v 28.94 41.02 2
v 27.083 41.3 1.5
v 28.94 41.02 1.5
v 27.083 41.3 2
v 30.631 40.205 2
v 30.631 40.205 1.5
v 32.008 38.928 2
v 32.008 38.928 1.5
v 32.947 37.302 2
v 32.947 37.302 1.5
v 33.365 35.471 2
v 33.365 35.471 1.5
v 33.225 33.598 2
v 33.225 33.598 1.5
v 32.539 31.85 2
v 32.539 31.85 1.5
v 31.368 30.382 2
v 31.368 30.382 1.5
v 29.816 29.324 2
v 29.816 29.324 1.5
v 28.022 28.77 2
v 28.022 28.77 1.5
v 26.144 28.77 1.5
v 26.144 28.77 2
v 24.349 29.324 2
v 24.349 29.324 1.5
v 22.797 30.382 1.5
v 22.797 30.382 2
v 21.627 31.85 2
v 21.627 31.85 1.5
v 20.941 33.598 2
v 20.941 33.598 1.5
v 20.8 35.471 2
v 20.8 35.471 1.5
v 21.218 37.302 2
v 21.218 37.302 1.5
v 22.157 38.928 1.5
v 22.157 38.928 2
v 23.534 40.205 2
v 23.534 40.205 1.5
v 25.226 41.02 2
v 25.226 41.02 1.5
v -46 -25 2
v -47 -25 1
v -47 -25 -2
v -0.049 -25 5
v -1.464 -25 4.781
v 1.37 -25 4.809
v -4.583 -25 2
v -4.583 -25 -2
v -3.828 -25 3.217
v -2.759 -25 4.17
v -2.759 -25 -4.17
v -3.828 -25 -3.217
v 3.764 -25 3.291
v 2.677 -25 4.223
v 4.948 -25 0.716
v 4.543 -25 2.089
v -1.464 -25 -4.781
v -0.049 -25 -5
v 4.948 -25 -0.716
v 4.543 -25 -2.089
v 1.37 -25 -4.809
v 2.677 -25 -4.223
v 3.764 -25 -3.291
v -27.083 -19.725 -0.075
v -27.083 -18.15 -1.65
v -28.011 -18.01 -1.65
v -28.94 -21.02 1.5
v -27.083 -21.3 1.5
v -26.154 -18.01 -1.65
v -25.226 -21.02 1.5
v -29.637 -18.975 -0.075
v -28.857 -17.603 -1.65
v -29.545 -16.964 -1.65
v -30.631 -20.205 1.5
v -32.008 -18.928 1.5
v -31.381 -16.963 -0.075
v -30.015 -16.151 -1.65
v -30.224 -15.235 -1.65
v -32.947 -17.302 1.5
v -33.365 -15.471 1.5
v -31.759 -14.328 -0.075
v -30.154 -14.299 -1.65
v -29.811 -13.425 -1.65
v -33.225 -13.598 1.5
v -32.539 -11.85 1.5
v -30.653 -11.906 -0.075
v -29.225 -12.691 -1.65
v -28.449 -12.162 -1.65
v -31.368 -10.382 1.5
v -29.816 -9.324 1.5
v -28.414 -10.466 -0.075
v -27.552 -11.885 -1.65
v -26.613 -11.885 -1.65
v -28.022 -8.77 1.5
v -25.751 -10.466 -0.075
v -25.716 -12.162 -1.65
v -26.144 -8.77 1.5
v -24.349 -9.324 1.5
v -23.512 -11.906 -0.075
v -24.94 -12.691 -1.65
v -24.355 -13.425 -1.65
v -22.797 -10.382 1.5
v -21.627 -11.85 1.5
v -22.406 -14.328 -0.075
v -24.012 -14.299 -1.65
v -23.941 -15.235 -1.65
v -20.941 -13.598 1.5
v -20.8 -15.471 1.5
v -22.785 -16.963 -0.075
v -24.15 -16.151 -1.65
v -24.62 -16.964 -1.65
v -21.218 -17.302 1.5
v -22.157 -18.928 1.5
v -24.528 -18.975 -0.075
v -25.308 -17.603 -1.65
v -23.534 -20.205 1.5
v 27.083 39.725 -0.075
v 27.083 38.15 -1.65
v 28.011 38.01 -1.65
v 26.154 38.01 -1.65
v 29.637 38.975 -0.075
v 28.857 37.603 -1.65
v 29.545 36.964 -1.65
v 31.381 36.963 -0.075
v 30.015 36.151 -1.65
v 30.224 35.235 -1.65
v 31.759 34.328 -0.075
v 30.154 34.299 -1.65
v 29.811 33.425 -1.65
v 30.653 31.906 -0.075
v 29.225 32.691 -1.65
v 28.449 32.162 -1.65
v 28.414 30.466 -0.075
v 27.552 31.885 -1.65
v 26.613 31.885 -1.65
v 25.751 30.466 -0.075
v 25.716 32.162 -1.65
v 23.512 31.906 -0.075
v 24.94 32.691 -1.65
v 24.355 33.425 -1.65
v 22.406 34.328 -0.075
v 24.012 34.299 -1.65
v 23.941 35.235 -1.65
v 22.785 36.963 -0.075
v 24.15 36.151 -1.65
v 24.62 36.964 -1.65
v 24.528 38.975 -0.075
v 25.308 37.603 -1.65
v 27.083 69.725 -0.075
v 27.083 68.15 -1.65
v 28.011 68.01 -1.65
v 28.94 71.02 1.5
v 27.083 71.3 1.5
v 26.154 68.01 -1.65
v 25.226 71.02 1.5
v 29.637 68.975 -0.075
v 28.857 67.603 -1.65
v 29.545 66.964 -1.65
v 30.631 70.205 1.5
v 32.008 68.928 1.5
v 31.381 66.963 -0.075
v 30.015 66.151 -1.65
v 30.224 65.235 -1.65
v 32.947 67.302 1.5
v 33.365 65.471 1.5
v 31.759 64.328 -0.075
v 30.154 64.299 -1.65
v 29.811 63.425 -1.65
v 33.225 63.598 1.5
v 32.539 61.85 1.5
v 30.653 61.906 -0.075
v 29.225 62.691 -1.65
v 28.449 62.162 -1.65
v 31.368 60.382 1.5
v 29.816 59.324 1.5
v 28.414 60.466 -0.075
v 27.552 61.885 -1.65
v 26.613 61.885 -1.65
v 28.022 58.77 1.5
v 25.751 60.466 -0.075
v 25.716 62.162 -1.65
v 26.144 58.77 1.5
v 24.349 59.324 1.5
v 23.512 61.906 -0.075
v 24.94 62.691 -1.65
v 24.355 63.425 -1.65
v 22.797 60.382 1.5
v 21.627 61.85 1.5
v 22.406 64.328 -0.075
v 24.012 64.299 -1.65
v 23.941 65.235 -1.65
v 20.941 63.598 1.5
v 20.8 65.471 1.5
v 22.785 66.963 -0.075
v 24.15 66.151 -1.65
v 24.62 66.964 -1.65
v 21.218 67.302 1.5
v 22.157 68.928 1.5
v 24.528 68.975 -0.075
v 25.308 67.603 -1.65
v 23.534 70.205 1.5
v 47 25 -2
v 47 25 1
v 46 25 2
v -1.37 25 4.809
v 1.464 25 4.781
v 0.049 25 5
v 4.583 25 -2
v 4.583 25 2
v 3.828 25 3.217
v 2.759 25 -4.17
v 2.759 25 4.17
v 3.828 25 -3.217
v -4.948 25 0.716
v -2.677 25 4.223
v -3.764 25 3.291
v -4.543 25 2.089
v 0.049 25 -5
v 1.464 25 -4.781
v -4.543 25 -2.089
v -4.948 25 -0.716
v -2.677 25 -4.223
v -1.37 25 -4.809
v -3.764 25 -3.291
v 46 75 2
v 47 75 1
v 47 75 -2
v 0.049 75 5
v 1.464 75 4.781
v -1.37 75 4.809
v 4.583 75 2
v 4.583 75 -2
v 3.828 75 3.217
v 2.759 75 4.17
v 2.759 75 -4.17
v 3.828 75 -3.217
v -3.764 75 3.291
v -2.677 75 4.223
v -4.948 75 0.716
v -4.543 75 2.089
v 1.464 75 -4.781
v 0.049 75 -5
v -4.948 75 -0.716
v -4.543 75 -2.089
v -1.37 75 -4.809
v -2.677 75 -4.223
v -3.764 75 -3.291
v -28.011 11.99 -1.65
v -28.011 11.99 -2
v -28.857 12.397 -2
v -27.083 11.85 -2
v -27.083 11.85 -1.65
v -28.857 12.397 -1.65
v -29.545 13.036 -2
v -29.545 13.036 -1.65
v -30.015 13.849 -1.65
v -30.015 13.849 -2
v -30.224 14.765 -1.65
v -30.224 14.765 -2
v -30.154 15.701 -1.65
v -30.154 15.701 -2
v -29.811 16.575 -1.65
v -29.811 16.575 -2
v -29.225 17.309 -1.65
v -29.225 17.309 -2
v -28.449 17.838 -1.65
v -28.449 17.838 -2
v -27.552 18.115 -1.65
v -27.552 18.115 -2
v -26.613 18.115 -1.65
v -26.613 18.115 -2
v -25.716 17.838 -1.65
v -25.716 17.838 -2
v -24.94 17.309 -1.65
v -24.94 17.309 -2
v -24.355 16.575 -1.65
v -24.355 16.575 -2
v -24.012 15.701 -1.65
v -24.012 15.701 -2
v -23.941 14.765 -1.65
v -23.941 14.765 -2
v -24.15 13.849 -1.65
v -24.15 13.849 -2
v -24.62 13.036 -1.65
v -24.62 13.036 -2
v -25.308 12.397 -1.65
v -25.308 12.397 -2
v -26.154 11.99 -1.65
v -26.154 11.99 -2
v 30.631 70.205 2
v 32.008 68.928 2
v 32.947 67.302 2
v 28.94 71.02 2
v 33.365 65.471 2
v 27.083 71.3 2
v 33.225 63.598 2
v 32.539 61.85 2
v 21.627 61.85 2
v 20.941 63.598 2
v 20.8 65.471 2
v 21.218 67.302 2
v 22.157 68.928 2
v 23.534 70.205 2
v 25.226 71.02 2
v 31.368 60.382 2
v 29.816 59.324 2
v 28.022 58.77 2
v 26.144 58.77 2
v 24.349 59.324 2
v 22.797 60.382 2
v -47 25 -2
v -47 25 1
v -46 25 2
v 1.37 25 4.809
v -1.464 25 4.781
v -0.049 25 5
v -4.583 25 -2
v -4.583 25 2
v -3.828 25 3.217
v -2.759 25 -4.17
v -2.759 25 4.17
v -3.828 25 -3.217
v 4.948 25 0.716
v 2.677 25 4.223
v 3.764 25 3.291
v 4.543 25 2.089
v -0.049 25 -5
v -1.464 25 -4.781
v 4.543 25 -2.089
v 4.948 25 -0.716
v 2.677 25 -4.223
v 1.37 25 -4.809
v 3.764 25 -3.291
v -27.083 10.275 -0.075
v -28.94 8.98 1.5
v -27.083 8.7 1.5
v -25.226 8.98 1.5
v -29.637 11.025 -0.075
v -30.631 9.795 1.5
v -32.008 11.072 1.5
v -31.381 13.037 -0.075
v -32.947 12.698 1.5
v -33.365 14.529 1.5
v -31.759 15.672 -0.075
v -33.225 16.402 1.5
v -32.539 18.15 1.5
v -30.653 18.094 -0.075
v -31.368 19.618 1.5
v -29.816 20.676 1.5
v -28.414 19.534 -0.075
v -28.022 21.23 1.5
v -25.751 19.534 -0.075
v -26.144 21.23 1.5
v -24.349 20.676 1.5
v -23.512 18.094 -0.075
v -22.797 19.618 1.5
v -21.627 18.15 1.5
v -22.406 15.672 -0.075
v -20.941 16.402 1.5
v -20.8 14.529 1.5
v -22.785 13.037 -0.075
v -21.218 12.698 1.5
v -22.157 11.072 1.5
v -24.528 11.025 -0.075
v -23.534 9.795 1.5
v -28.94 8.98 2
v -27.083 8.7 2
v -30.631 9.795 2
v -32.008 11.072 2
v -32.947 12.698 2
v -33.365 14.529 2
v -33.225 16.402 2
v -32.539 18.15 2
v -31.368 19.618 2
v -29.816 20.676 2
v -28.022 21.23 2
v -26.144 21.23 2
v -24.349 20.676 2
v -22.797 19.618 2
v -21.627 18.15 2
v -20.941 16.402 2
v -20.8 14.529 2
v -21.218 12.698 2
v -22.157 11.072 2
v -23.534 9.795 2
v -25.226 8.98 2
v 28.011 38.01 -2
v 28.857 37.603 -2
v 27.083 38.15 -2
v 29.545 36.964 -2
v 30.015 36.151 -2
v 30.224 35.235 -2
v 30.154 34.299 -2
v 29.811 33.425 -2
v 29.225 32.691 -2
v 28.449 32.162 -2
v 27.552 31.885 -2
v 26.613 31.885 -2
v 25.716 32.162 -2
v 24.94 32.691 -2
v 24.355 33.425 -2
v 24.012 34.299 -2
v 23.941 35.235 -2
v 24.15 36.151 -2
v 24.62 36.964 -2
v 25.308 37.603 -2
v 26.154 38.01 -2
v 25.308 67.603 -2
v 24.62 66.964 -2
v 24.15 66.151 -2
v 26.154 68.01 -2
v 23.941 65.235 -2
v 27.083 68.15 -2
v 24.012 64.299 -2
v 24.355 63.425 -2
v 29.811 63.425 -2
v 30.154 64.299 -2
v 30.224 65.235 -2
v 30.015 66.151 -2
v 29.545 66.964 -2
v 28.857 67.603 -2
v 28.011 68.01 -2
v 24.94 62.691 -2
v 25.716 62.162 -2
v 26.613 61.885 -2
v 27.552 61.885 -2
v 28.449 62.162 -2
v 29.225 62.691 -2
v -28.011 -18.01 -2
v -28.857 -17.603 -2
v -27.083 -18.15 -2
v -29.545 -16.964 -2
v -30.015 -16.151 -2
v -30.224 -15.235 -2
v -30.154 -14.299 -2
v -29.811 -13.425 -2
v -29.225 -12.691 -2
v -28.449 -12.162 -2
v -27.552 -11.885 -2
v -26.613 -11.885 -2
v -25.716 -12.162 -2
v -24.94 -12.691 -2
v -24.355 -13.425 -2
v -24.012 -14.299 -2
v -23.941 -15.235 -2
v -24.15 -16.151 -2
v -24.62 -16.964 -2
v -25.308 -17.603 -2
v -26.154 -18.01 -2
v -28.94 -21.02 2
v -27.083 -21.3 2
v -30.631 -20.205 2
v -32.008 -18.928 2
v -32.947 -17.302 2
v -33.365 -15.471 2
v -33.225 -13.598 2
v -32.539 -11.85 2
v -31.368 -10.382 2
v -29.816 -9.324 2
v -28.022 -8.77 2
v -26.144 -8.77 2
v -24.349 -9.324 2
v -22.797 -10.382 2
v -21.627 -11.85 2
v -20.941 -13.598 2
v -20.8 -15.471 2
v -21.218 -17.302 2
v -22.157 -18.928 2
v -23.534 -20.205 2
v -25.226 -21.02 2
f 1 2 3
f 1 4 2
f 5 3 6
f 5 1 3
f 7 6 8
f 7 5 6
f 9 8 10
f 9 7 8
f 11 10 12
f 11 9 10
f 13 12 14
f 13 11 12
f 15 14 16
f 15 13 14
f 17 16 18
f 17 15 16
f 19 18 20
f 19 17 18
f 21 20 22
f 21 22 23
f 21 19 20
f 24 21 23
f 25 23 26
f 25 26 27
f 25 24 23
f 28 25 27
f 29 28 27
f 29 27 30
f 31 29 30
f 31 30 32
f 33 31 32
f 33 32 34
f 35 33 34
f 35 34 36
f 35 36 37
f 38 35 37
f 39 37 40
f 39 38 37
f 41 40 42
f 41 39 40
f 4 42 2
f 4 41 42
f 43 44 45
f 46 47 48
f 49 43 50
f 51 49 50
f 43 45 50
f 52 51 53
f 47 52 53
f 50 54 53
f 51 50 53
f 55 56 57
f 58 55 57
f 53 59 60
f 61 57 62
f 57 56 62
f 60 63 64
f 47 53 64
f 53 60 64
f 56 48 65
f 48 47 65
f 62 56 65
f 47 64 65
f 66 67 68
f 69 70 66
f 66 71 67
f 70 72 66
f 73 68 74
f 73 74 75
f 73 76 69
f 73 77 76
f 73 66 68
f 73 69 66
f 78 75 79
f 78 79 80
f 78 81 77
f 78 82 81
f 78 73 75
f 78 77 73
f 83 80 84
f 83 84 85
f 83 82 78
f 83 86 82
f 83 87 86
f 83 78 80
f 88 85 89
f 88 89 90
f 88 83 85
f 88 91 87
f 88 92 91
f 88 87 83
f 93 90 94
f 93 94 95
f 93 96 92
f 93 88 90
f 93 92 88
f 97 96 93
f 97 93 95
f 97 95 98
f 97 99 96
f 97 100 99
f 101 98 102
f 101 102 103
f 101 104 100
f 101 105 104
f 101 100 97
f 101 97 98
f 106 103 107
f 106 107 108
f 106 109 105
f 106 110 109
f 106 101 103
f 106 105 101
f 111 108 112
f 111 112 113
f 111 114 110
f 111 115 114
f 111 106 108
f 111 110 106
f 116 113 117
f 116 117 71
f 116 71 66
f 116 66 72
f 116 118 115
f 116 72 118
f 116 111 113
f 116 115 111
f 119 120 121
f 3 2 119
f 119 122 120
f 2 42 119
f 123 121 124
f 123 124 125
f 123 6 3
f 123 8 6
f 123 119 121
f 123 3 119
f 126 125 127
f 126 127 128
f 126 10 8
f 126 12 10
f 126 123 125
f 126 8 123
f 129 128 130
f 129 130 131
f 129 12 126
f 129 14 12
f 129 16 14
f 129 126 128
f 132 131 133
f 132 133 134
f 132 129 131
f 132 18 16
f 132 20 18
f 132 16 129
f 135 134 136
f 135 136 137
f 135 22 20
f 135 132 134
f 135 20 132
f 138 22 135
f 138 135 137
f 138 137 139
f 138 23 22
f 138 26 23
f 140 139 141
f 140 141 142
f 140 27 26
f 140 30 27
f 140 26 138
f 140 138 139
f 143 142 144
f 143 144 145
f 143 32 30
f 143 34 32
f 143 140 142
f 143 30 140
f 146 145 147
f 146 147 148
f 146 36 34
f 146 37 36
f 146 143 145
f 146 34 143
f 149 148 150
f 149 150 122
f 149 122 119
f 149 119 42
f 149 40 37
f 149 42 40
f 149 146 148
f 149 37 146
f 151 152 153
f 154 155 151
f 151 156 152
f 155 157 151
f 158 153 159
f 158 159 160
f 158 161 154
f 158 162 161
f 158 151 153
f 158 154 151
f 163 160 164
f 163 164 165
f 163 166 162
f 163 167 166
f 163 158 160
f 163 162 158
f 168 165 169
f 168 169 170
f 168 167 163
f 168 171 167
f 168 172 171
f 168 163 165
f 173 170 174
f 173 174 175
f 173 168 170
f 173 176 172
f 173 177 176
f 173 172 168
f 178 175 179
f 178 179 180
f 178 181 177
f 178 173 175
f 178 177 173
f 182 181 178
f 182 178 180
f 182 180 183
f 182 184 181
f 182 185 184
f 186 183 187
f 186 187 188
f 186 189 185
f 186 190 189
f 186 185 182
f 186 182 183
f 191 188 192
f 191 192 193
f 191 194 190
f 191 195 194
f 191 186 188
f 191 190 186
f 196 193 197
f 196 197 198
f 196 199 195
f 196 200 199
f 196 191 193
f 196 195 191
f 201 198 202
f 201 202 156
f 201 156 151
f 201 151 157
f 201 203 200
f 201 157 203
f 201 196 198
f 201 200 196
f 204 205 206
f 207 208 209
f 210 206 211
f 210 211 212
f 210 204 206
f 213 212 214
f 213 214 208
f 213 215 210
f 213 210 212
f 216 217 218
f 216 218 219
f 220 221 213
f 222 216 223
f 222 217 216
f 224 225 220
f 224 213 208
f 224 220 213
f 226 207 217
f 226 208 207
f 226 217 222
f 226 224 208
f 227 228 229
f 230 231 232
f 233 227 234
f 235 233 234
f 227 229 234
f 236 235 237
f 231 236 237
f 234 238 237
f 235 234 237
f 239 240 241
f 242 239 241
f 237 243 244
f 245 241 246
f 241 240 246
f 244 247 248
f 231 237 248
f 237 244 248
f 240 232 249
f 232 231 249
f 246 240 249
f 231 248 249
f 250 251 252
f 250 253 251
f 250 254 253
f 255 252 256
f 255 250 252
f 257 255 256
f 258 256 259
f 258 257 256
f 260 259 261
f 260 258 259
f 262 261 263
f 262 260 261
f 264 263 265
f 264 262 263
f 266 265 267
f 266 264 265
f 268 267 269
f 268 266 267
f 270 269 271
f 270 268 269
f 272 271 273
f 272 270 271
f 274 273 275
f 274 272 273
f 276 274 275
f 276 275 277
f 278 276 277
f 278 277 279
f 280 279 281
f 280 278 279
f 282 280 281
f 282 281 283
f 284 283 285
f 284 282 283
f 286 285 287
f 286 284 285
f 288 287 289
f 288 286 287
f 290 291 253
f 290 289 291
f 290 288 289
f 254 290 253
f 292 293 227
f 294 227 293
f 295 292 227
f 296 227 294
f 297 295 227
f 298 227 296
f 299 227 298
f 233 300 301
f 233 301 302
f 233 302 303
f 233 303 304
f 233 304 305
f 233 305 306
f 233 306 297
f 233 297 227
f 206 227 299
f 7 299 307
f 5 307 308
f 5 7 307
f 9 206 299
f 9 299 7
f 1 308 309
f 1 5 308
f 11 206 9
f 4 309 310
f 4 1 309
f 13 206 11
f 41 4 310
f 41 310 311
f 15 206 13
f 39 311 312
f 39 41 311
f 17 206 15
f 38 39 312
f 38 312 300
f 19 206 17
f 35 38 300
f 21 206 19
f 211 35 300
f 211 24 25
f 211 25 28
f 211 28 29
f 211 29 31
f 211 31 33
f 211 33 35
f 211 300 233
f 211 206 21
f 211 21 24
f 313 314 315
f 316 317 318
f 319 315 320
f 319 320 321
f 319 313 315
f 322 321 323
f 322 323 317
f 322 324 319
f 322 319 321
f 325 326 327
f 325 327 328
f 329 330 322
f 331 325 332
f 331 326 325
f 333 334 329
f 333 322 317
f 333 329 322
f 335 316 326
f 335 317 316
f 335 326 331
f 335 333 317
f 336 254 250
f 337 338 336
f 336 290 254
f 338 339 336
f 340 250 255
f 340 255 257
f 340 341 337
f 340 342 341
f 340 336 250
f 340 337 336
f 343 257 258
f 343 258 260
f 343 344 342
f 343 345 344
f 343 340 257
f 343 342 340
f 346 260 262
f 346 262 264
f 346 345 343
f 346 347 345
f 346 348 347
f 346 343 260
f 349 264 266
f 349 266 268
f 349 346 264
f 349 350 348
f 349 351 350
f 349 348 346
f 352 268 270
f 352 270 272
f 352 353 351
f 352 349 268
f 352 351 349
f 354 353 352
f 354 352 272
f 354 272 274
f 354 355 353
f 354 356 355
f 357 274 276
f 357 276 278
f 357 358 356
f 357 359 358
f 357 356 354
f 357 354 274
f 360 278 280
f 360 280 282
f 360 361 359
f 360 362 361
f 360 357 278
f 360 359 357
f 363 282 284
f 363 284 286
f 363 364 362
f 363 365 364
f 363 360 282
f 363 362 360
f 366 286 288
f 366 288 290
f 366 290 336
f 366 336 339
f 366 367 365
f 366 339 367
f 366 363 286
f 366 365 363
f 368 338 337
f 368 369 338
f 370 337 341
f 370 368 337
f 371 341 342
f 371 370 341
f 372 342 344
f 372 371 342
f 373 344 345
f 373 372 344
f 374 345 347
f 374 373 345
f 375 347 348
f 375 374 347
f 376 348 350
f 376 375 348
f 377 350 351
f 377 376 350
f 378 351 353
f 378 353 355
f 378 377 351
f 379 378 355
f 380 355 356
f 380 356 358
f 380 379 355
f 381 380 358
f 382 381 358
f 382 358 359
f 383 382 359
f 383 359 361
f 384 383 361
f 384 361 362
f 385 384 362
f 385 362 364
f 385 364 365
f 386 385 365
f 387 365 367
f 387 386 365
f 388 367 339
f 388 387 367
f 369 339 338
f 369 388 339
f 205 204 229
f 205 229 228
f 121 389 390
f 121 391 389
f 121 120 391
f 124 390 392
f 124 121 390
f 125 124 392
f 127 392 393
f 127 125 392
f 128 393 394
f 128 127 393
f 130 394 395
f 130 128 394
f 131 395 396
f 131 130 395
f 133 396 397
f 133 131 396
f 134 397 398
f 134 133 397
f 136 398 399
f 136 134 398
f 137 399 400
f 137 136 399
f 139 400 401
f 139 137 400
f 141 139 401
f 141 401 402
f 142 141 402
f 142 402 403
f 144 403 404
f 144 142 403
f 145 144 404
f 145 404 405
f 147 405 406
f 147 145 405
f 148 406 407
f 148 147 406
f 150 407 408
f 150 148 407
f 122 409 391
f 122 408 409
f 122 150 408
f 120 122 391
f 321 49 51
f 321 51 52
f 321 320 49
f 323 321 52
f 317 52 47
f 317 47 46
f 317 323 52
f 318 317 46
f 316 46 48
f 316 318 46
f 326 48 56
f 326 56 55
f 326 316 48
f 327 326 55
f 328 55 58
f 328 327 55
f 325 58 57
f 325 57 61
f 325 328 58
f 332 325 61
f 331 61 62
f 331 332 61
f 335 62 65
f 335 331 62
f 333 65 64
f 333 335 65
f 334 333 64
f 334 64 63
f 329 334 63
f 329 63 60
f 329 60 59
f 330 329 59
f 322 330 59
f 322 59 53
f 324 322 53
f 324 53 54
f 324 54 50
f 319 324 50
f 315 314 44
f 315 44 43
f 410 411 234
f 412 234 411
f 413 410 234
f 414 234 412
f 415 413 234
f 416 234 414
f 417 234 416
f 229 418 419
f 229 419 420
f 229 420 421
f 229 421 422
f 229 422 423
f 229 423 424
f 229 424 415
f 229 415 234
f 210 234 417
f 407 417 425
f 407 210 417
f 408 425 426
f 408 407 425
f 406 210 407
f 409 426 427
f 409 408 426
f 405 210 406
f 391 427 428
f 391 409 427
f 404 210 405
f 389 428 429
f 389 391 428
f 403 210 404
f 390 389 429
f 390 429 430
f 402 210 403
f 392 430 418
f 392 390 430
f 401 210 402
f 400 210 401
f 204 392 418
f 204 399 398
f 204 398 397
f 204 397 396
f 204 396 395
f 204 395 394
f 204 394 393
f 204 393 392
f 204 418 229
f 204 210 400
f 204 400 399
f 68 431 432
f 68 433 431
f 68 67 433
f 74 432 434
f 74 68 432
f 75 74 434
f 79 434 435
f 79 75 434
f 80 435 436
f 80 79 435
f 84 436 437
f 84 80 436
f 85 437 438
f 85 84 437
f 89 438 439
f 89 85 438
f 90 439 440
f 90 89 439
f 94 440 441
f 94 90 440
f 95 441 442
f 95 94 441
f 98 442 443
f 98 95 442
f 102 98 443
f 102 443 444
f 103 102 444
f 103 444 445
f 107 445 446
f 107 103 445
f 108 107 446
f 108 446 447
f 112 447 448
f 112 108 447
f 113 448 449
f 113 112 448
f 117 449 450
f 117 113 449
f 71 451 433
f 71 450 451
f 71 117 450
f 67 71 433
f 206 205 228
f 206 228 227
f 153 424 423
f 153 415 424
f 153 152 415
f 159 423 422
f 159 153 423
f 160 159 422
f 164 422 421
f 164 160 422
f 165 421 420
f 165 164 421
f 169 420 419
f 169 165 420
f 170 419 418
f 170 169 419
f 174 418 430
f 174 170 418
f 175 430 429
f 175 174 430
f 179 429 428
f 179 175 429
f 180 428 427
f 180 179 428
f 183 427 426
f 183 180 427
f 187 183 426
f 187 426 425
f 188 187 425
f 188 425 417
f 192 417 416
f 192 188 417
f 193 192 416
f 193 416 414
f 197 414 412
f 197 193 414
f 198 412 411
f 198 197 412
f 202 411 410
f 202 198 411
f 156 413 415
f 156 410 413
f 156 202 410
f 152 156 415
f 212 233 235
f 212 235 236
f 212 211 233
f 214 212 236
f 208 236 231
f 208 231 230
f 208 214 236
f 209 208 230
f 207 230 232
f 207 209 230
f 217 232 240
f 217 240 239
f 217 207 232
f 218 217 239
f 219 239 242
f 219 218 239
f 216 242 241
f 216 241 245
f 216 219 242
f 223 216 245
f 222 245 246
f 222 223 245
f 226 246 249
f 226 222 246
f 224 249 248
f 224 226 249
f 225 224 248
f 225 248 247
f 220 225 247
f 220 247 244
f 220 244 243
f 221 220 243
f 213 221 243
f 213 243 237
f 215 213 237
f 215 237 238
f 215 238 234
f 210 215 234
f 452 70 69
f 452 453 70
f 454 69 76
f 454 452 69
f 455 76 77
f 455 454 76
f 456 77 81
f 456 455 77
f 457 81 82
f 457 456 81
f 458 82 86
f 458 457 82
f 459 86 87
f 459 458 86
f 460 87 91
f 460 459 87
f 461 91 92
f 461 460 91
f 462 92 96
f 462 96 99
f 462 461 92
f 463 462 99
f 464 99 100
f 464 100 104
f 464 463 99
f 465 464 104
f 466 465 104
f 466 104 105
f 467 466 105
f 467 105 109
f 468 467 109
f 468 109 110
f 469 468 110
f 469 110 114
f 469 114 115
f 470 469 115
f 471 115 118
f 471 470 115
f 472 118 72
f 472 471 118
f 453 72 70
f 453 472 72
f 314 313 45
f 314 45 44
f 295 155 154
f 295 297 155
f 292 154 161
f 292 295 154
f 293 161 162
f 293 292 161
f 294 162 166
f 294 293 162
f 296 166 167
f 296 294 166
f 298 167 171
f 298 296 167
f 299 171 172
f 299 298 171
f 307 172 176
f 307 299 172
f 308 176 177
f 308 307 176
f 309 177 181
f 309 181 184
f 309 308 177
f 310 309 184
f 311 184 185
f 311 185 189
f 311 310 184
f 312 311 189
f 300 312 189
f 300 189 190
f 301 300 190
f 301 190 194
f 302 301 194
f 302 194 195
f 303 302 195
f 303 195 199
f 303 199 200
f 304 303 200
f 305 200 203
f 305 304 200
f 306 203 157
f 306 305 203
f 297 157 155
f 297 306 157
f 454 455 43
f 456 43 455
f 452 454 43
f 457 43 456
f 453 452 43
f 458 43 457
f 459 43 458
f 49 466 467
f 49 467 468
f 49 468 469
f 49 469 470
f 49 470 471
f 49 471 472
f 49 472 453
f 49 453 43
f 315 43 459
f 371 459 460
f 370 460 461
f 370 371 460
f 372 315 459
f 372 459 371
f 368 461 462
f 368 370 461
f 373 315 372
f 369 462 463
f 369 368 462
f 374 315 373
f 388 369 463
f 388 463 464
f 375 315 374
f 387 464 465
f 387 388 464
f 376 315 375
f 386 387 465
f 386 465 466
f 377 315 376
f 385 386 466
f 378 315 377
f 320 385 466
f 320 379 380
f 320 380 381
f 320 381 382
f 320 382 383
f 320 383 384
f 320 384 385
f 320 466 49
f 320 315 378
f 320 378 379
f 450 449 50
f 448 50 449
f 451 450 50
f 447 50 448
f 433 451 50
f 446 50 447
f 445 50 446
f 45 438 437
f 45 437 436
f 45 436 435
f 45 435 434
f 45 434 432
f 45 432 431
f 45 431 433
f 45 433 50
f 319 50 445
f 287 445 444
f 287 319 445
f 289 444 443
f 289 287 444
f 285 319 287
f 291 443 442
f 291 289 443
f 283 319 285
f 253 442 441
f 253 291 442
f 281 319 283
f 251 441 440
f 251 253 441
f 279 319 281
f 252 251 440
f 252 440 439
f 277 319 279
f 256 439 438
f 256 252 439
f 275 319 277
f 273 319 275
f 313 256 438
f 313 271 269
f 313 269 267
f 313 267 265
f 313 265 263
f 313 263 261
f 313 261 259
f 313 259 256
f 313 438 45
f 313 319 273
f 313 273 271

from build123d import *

# Parameters (mm, degrees)
EXTRUDE_1_DEPTH            = 25
HOLE_WIZARD_M61_AT_2_COUNT = 2
HOLE_WIZARD_M61_AT_2_PITCH = 30
PATTERN_CIRCULAR_1_COUNT   = 2


with BuildPart() as part:
    # Эскиз1 → Бобышка-Вытянуть1 (new body, symmetric)
    with BuildSketch(Plane(origin=(0, 0, 0), x_dir=(1, 0, 0), z_dir=(0, 1, 0))):
        with BuildLine():
            Line((-4.582575695, 2), (-47, 2))
            Line((-47, 2), (-47, -1))
            Line((-47, -1), (-46, -2))
            Line((-46, -2), (-4.582575695, -2))
            ThreePointArc((-4.582575695, -2), (5, 0), (-4.582575695, 2))
        make_face()
    extrude(amount=EXTRUDE_1_DEPTH, both=True)

    # Эскиз6 → Зенковка для винта с полупотайной головкой M61 (revolve, cut)
    with BuildSketch(Plane(origin=(-27.082575695, 15, 2), x_dir=(0, -1, 0), z_dir=(1, 0, 0))):
        Polygon((0, 0), (0, 7), (3.15, 7), (3.15, 3.65), (6.3, 0.5), (6.3, 0), align=None)
    hole_wizard_m61 = revolve(axis=Axis((-27.082575695, 15, 8.35), (0, 0, -1)), mode=Mode.SUBTRACT)

    # Зенковка для винта с полупотайной головкой M61 at 2: Зенковка для винта с полупотайной головкой M61 ×2
    with Locations(*[(0, -i * HOLE_WIZARD_M61_AT_2_PITCH, 0) for i in range(1, HOLE_WIZARD_M61_AT_2_COUNT)]):
        add(hole_wizard_m61, mode=Mode.SUBTRACT)


with BuildPart() as pattern_circular_1_1:
    # Круговой массив1: pattern copy
    add(part.part.rotate(Axis((0, 25, 0), (0, 0, 1)), 1 * 360 / PATTERN_CIRCULAR_1_COUNT))


solid = Compound([part.part, pattern_circular_1_1.part])
